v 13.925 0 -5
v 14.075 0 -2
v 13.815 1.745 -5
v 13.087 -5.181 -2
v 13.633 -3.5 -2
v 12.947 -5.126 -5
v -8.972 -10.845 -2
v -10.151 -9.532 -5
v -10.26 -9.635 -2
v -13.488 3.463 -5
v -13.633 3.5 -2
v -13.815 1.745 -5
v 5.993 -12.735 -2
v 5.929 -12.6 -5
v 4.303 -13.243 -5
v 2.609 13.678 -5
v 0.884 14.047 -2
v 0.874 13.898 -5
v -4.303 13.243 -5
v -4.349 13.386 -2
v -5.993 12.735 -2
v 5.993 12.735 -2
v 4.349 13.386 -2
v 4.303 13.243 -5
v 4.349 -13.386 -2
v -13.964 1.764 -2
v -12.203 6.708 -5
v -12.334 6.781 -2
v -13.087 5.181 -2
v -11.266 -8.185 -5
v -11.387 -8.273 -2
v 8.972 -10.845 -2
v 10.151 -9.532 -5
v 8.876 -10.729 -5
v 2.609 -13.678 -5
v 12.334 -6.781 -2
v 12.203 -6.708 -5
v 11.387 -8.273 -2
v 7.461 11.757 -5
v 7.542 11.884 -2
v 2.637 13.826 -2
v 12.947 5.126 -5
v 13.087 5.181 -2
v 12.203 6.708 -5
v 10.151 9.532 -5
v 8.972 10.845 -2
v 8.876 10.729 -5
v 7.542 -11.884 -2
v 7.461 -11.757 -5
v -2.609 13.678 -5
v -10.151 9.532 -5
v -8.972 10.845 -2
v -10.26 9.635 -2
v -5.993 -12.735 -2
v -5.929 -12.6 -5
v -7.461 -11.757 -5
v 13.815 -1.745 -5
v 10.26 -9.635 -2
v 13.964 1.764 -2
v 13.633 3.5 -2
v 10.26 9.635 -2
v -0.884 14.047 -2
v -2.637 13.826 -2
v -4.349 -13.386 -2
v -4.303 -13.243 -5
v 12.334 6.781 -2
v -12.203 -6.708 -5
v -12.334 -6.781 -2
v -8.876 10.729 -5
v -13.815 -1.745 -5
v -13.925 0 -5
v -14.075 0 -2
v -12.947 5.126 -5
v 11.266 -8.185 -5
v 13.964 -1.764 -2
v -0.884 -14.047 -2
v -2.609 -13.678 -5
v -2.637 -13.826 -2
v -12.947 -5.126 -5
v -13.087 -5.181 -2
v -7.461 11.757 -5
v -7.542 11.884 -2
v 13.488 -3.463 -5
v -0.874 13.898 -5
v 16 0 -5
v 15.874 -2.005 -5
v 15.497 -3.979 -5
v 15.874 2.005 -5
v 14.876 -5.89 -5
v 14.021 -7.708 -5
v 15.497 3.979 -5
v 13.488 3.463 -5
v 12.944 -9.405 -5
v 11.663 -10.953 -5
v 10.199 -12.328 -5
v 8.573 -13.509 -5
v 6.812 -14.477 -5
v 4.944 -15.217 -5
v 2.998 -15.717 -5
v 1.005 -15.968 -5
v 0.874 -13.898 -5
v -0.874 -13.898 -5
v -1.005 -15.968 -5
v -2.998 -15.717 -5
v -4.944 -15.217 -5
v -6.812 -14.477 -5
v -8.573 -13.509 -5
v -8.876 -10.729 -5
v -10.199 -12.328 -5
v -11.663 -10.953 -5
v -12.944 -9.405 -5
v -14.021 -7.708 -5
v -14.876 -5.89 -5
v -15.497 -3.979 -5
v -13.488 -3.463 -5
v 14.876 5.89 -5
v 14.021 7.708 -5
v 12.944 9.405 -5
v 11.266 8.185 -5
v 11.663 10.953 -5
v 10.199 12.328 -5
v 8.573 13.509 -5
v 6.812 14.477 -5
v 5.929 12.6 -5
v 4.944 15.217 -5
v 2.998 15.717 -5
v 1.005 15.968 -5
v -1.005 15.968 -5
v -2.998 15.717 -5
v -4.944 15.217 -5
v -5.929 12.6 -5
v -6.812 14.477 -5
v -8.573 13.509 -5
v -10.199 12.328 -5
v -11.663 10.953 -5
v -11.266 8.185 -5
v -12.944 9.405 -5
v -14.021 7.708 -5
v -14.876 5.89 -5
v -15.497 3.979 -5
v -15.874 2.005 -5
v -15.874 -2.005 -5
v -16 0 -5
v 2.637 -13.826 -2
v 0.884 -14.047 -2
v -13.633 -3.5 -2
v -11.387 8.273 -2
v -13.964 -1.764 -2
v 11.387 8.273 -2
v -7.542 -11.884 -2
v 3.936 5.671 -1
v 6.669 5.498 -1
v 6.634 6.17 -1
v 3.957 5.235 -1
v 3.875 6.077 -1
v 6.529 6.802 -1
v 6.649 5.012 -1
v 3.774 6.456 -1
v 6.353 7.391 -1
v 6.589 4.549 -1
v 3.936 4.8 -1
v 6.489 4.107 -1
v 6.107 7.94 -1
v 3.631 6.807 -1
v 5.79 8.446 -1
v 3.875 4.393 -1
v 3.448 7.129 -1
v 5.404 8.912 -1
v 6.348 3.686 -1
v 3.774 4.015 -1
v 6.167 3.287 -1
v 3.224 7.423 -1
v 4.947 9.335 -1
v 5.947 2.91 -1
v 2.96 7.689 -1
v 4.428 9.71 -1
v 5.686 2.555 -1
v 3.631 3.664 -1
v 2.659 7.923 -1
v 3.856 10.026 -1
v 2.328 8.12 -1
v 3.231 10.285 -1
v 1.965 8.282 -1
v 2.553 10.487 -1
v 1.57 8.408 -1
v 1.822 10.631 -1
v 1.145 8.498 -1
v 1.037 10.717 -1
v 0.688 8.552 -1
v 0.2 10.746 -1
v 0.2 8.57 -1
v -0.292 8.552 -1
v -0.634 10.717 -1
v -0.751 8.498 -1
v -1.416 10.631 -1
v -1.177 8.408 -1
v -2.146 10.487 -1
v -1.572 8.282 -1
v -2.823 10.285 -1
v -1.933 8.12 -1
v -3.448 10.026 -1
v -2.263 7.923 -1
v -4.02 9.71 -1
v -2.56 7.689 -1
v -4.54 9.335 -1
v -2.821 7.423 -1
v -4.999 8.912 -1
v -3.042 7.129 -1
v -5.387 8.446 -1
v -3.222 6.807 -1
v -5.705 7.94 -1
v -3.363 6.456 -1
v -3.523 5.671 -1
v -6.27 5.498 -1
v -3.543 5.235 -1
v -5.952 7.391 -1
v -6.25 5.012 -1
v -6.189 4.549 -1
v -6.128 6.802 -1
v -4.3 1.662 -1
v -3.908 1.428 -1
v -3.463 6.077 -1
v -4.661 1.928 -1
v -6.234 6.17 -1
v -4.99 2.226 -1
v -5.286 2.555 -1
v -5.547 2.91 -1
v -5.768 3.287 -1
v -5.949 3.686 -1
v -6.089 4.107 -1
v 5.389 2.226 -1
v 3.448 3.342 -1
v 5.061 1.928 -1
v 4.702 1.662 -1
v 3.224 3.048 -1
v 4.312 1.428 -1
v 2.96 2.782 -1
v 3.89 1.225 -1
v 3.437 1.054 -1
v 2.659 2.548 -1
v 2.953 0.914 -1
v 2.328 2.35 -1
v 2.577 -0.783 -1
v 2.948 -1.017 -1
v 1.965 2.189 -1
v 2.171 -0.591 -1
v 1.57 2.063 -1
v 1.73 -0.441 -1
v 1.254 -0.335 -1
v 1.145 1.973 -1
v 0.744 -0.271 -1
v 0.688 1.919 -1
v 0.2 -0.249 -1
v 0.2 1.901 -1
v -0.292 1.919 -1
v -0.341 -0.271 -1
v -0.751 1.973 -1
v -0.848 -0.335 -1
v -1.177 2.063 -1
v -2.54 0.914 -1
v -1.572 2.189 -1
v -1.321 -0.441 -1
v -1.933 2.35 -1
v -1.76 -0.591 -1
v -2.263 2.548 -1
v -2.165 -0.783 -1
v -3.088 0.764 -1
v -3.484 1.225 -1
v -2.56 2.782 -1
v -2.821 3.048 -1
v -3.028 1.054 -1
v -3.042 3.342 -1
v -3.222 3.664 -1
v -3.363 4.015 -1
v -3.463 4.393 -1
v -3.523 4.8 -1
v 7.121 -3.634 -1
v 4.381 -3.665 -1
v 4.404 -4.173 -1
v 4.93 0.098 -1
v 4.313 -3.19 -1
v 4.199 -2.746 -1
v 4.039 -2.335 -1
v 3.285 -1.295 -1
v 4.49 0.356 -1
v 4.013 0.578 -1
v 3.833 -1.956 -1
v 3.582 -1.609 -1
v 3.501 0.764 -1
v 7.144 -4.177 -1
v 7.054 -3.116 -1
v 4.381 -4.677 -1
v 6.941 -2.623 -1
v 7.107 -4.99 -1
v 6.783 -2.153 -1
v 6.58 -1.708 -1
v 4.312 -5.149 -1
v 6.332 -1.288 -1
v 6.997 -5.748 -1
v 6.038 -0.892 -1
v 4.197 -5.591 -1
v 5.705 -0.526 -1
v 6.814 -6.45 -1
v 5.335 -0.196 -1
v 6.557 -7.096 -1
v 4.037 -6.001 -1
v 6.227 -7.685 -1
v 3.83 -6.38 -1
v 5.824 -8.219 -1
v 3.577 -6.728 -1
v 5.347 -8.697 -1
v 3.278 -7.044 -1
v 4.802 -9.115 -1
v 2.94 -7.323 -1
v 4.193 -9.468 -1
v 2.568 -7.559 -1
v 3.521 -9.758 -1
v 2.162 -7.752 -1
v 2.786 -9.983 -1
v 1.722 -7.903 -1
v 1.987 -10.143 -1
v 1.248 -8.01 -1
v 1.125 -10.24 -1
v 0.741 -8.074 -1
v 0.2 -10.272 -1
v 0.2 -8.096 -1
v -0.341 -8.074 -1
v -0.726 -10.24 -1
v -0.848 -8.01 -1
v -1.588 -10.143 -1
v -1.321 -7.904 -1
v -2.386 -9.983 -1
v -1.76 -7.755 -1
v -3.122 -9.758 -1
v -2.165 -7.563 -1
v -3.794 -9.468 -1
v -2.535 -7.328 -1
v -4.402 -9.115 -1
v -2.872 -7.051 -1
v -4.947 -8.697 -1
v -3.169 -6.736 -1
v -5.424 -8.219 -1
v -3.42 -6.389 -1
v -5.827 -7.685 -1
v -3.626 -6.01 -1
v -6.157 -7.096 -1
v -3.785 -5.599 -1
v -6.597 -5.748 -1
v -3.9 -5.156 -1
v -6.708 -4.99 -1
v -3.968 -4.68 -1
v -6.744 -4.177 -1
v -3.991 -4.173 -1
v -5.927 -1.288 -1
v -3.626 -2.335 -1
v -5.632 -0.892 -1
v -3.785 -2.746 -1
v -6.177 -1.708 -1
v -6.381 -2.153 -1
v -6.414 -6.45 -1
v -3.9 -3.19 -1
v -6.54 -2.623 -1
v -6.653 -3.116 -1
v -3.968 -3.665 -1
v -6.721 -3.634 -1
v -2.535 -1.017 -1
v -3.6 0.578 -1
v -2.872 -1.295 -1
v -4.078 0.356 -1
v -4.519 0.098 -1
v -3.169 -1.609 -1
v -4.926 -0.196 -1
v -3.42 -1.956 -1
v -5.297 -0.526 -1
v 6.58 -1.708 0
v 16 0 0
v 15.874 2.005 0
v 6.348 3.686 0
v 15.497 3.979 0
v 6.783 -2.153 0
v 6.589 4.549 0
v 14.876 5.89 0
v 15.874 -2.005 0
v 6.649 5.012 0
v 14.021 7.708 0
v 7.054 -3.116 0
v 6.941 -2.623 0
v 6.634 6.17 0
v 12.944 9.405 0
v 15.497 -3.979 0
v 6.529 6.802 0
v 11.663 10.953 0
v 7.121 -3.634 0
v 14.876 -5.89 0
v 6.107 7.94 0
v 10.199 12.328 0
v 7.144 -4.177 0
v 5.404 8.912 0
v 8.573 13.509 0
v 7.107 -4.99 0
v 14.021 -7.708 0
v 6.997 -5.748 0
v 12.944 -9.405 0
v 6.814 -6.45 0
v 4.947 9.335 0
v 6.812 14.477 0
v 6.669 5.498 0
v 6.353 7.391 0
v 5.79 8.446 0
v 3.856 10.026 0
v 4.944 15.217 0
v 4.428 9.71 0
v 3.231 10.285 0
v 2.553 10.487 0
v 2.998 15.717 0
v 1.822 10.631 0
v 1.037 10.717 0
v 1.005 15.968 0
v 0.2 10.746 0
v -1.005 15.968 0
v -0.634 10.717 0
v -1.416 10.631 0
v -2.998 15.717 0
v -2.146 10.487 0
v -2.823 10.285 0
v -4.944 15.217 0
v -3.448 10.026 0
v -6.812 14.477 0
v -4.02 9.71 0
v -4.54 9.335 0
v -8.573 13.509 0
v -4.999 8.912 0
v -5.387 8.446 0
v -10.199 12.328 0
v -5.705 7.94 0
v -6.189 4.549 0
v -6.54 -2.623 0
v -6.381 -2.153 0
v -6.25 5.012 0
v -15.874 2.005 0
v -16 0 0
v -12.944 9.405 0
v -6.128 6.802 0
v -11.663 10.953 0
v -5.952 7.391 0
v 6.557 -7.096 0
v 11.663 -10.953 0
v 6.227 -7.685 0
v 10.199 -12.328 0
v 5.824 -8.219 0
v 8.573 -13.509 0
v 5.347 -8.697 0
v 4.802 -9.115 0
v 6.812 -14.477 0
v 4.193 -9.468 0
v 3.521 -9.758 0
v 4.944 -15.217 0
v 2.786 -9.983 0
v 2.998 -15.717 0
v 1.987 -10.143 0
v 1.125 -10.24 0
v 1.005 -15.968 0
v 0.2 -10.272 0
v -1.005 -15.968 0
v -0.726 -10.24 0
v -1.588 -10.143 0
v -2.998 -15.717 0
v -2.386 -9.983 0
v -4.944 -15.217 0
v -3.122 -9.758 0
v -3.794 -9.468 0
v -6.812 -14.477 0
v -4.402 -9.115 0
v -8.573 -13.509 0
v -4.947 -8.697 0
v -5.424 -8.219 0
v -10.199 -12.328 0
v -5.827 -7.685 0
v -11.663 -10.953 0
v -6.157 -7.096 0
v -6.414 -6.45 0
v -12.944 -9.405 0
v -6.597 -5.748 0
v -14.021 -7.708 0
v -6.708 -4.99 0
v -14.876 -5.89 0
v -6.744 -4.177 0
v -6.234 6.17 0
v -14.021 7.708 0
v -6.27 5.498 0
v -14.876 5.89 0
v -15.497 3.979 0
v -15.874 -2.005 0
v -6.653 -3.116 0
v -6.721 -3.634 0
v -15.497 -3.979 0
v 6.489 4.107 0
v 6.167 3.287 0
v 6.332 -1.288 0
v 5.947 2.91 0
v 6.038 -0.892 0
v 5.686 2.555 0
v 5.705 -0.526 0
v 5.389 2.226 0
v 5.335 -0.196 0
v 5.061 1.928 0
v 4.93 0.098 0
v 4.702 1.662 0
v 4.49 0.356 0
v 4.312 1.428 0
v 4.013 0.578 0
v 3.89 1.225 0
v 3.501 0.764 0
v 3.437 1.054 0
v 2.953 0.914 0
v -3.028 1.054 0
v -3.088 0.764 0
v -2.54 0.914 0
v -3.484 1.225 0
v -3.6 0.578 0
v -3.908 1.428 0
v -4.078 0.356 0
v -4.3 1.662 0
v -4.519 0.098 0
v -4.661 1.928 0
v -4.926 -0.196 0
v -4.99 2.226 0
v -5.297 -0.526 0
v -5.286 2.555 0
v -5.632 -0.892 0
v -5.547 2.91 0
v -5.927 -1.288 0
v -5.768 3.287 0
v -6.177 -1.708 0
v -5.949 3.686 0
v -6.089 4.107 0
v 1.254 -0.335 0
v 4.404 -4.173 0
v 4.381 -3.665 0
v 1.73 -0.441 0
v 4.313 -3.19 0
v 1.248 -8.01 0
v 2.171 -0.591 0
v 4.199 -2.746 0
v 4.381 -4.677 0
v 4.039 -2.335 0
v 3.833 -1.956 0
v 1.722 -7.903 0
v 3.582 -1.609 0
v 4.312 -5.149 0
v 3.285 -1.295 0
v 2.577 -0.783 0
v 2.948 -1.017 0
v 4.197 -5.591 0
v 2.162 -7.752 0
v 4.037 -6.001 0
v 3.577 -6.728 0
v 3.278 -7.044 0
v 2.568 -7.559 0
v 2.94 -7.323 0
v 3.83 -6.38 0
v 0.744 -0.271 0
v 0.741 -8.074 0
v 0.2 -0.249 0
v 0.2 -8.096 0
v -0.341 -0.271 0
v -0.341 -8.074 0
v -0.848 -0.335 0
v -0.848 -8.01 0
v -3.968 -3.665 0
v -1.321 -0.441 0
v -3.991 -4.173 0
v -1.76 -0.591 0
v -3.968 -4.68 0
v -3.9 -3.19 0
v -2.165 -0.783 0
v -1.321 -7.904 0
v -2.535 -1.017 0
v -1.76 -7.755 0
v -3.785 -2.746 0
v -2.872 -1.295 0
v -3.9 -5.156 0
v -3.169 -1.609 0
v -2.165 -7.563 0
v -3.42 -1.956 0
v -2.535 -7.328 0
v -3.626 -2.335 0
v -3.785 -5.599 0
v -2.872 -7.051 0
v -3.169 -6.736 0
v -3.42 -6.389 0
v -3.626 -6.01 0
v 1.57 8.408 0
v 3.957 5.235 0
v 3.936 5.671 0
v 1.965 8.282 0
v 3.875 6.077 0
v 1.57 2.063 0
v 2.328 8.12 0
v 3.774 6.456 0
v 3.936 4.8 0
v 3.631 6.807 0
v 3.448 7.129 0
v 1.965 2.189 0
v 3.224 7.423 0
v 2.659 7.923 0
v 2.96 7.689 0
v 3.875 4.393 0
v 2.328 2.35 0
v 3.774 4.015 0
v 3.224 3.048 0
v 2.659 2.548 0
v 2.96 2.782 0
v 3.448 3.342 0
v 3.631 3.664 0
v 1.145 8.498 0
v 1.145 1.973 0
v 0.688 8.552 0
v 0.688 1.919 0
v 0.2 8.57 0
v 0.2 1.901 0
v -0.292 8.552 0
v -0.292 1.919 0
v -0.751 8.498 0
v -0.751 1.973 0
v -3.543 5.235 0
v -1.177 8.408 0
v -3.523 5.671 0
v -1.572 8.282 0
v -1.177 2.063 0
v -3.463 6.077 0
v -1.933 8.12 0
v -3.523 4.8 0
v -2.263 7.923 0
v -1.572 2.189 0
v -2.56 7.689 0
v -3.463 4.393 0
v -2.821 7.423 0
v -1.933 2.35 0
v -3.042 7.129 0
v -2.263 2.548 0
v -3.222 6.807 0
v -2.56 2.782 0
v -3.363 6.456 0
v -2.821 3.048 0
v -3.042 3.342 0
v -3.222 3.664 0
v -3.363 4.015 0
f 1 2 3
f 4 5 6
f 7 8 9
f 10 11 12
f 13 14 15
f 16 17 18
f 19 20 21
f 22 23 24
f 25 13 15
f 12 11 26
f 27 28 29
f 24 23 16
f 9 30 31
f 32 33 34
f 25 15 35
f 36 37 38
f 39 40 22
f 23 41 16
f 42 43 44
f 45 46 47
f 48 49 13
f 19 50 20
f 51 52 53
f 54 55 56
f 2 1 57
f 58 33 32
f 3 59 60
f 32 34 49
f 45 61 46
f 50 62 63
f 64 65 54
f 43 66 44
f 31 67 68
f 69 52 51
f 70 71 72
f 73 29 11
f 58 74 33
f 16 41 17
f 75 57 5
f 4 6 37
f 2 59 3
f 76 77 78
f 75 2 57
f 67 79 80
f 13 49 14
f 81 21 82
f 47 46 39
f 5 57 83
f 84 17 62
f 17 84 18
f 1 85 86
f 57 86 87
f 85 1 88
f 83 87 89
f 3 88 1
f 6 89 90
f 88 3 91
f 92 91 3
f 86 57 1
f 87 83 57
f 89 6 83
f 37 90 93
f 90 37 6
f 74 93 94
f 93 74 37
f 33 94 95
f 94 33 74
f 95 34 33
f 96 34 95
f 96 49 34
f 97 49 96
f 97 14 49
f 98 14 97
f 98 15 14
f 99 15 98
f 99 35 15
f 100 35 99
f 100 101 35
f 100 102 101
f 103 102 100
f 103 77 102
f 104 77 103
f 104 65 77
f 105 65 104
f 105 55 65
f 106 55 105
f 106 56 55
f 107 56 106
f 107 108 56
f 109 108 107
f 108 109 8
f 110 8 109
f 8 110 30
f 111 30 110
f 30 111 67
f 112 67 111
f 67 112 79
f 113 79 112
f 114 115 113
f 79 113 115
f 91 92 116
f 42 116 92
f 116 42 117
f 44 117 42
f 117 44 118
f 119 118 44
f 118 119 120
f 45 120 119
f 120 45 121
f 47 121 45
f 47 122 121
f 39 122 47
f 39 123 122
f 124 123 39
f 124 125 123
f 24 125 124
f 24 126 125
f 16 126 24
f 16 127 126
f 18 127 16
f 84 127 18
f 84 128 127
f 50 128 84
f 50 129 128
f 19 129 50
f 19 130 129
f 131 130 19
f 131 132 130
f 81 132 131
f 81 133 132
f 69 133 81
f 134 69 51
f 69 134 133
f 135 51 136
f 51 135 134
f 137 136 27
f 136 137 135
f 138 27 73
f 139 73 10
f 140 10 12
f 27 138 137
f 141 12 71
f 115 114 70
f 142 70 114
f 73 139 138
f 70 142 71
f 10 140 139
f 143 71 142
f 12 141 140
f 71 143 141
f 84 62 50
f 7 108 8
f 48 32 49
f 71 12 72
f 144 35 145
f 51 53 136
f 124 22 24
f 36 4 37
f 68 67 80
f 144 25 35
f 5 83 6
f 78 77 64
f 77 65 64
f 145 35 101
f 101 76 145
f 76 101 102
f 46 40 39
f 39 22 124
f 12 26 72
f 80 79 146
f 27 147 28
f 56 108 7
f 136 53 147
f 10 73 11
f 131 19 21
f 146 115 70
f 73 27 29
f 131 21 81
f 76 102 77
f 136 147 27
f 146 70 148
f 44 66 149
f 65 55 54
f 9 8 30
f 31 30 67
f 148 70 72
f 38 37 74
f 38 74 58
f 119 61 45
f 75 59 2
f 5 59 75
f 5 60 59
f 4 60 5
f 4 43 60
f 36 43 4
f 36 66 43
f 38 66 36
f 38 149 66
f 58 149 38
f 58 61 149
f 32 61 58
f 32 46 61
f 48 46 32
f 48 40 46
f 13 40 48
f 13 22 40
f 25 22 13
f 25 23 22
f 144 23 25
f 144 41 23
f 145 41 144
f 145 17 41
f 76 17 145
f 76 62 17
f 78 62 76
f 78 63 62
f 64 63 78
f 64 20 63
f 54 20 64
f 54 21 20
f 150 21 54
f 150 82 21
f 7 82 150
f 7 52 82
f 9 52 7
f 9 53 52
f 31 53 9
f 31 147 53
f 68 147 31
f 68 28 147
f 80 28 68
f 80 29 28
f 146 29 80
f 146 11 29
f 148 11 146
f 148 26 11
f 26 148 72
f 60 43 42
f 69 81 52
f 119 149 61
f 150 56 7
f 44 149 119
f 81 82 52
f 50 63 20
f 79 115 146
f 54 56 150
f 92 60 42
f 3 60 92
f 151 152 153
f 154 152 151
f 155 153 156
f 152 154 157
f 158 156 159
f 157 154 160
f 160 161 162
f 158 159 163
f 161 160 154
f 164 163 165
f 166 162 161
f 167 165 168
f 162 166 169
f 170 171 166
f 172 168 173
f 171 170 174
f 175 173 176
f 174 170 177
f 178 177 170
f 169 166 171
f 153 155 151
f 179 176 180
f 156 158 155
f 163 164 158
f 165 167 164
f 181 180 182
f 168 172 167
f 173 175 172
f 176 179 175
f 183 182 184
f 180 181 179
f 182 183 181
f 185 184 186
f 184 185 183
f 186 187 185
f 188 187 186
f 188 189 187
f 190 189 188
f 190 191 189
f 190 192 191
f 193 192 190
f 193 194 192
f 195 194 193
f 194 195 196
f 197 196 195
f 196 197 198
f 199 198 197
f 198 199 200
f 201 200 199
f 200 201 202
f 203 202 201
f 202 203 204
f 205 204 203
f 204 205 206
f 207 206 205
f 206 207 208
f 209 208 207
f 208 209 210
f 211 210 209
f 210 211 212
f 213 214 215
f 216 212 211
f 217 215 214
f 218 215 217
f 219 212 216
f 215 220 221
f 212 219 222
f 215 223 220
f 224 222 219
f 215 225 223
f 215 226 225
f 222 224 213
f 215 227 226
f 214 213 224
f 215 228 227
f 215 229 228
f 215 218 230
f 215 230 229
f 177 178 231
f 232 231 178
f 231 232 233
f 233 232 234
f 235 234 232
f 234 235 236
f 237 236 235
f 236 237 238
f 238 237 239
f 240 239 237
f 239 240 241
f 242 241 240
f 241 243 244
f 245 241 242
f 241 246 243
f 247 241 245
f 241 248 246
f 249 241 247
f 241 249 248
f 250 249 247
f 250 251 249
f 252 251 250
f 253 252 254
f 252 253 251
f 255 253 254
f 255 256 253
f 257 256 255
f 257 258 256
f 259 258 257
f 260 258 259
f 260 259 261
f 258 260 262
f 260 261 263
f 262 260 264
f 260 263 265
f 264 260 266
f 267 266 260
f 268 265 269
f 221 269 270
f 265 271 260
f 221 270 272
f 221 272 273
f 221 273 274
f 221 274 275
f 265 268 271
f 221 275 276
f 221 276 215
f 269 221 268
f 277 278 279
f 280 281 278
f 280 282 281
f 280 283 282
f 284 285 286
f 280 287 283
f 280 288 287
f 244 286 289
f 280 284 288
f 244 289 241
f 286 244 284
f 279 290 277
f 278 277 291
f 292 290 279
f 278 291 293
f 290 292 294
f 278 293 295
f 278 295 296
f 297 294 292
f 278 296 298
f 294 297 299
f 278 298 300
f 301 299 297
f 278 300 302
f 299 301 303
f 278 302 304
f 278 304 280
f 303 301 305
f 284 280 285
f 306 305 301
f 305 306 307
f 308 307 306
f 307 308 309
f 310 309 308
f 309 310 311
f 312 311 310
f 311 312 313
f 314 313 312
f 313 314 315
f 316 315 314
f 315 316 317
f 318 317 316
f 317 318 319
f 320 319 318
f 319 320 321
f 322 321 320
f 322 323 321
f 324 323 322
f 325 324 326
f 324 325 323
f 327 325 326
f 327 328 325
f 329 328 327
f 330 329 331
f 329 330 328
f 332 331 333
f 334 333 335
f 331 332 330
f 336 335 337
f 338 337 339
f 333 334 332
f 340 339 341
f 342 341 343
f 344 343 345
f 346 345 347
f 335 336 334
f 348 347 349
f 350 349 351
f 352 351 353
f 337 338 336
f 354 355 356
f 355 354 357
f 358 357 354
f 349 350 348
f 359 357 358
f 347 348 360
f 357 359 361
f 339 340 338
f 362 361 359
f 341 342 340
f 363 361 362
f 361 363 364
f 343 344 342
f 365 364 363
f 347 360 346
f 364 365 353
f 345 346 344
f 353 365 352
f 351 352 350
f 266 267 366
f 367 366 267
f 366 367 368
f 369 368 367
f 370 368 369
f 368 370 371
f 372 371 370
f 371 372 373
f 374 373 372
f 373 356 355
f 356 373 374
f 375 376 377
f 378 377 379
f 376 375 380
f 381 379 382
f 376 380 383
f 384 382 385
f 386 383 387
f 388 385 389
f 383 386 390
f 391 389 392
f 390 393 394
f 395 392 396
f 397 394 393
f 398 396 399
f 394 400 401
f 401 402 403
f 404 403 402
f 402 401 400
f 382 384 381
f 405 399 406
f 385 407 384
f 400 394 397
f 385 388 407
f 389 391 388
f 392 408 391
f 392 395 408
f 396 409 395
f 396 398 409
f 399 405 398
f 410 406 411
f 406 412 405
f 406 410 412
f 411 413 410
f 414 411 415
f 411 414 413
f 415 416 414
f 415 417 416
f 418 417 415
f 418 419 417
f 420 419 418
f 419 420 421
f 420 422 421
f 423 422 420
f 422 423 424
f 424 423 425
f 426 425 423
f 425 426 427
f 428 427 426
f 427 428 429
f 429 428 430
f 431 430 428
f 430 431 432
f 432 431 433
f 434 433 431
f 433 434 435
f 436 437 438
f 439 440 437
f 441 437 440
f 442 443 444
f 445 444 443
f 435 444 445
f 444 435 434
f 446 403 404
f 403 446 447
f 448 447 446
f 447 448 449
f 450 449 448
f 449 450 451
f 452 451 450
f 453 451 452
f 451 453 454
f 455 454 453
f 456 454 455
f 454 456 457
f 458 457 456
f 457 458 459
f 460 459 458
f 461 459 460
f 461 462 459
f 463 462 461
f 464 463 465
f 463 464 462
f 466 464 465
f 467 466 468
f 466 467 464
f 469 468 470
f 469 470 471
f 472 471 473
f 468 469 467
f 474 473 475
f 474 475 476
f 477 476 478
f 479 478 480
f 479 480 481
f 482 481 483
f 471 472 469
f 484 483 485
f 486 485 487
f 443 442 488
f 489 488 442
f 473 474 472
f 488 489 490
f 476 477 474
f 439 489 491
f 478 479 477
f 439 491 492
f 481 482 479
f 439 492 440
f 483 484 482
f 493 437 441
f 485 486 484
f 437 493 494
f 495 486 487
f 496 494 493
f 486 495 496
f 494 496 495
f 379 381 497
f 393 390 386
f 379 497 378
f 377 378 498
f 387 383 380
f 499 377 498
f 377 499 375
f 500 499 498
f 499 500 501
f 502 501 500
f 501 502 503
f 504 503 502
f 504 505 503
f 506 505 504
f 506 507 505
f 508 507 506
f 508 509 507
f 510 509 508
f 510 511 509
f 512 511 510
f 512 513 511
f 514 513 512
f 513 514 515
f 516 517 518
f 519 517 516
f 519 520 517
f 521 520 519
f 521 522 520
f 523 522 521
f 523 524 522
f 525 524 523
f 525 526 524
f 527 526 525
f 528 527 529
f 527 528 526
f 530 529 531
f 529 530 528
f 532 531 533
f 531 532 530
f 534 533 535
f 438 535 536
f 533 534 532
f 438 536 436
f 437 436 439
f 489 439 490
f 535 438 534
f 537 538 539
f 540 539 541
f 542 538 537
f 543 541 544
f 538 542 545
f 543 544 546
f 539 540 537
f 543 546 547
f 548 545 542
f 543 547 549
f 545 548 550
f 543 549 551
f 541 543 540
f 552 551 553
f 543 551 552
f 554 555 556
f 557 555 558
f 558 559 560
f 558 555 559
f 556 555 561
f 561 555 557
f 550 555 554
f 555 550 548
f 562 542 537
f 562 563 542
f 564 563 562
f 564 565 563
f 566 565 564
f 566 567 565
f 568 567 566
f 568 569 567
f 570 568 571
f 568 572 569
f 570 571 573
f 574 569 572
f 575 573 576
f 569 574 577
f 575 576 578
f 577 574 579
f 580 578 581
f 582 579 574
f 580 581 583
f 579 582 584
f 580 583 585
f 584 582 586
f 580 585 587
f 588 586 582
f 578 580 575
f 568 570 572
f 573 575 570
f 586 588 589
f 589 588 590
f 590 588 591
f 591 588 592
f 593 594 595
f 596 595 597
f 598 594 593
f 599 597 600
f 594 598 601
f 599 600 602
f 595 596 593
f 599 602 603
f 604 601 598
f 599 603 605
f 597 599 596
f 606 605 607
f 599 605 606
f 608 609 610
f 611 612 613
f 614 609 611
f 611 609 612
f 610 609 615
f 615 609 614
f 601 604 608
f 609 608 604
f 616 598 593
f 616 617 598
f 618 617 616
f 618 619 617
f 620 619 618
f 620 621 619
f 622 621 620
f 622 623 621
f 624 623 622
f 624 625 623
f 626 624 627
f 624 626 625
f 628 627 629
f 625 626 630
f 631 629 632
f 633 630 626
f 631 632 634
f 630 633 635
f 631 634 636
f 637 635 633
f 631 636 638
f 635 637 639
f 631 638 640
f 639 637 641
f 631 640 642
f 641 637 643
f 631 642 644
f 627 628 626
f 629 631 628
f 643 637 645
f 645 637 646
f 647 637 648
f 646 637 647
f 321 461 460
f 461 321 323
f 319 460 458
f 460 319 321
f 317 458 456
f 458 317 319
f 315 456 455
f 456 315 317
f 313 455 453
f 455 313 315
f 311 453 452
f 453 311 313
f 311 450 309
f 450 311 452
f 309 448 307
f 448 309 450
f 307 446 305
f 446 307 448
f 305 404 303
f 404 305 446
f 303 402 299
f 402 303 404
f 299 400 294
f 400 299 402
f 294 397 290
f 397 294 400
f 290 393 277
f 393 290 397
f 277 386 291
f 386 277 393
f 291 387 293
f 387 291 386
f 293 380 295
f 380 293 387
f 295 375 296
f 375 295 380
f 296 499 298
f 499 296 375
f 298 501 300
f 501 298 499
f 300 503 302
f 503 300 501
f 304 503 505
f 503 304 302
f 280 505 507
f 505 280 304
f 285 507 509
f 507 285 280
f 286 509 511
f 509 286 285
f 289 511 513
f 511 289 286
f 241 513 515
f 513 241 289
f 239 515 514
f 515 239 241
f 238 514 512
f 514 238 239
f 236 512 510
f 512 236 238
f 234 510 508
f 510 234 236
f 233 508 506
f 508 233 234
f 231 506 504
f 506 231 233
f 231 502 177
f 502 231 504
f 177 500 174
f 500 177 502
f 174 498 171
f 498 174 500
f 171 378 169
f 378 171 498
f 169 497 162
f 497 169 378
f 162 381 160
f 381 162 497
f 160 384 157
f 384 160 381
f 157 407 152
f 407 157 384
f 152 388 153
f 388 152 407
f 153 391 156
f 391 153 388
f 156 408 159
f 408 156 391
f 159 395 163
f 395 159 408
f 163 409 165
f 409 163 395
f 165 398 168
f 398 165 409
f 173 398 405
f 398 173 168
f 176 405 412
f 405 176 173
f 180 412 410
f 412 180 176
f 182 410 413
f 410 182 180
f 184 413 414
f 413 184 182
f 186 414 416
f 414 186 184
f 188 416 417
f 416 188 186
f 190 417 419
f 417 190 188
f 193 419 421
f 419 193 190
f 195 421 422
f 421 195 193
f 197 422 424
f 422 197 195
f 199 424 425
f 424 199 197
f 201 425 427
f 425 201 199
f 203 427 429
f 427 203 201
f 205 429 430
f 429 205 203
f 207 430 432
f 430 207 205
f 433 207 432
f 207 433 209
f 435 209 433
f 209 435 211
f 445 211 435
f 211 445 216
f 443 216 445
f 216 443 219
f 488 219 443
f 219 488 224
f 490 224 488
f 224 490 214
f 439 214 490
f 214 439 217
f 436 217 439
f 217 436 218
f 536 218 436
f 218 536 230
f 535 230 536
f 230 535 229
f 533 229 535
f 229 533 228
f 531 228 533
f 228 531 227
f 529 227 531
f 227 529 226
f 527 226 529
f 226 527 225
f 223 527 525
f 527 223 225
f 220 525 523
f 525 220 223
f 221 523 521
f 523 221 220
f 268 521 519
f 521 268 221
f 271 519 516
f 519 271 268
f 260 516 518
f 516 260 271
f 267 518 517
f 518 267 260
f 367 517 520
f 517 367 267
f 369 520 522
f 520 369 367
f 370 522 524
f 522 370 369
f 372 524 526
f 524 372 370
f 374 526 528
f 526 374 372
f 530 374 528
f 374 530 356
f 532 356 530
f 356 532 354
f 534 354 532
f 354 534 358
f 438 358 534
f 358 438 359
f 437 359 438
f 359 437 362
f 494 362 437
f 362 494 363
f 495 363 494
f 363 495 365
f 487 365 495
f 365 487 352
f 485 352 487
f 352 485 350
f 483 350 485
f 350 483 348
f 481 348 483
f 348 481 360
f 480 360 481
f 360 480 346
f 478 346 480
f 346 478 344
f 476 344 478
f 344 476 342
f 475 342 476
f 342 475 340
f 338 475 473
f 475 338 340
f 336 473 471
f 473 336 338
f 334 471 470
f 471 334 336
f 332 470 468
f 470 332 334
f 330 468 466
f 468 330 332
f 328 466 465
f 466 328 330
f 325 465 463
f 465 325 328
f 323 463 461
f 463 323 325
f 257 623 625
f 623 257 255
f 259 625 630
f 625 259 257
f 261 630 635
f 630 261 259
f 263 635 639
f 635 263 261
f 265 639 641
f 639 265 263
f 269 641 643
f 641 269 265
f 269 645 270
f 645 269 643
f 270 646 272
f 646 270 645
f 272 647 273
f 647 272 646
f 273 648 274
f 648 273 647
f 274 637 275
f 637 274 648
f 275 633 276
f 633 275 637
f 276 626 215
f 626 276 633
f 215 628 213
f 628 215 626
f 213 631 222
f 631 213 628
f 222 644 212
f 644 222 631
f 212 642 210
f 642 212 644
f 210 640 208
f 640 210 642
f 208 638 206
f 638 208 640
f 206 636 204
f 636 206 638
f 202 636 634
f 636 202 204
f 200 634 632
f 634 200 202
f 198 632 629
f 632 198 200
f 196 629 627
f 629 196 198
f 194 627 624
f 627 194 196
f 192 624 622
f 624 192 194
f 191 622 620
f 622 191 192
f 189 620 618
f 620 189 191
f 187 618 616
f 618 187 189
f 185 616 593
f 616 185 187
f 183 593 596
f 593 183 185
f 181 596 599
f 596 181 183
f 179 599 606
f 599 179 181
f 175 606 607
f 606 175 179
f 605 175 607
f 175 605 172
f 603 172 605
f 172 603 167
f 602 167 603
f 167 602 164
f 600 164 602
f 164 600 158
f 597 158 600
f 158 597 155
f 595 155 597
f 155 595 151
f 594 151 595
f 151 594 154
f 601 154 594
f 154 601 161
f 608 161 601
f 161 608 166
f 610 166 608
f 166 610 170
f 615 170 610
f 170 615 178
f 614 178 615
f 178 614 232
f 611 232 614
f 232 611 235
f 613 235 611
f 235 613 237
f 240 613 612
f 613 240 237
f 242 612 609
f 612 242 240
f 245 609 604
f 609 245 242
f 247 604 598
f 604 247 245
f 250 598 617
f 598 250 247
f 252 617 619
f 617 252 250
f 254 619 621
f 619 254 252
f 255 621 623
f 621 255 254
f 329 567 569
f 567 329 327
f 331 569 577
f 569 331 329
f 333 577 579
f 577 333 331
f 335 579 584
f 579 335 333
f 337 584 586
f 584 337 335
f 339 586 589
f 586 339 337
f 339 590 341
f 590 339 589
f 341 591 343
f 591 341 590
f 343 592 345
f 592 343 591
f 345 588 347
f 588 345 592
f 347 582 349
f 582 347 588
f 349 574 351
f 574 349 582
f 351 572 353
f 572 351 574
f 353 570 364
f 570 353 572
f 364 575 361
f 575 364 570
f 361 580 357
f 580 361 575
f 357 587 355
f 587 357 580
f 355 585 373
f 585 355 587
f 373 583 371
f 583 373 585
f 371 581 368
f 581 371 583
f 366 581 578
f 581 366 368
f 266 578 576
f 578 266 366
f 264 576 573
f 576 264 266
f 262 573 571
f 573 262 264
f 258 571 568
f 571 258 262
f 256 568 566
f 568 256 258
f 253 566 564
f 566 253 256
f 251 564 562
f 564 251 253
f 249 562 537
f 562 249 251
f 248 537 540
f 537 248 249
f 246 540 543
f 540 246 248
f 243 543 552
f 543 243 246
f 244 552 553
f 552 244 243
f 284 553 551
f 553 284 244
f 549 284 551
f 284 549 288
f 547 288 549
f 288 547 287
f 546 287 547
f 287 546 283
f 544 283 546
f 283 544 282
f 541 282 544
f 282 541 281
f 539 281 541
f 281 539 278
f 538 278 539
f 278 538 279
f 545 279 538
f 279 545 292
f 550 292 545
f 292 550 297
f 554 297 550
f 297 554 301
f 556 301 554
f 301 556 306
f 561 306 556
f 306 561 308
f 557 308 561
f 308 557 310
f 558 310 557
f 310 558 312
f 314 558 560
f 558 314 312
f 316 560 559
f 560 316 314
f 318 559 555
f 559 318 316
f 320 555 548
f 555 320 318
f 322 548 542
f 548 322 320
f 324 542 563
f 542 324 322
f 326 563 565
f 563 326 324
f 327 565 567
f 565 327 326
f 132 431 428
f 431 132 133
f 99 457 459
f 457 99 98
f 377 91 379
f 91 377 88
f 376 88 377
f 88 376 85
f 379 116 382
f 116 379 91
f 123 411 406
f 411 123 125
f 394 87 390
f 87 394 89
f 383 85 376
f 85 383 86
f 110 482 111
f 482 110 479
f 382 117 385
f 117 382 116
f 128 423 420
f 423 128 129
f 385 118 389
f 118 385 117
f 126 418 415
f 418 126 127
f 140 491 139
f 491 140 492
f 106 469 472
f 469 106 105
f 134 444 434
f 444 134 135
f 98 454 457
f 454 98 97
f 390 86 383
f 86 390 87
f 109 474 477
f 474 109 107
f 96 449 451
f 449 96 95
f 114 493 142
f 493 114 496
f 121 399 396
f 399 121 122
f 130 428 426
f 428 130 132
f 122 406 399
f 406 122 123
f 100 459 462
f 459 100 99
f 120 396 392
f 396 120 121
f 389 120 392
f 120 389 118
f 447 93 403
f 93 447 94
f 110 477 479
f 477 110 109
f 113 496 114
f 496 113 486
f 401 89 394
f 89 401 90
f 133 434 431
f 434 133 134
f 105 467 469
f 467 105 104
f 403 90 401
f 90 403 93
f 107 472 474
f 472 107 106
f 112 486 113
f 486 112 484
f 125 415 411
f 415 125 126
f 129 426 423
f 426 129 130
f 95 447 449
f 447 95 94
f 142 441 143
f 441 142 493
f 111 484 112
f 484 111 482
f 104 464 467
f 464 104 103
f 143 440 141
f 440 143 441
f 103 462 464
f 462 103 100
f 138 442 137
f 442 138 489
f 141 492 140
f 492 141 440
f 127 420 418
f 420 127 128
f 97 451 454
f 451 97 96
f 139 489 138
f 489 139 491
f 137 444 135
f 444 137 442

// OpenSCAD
$fn = 50;


difference() {
	union() {
		translate(v = [0, 0, -5.0000000000]) {
			cylinder(h = 5, r = 16.0000000000);
		}
	}
	union() {
		#translate(v = [0, 0, -5.0000000000]) {
			cylinder(h = 3, r1 = 13.9250000000, r2 = 14.0750000000);
		}
		translate(v = [0, 0, -1]) {
			linear_extrude(height = 1) {
				text(font = "Impact", halign = "center", size = 20, text = "8", valign = "center");
			}
		}
	}
}
